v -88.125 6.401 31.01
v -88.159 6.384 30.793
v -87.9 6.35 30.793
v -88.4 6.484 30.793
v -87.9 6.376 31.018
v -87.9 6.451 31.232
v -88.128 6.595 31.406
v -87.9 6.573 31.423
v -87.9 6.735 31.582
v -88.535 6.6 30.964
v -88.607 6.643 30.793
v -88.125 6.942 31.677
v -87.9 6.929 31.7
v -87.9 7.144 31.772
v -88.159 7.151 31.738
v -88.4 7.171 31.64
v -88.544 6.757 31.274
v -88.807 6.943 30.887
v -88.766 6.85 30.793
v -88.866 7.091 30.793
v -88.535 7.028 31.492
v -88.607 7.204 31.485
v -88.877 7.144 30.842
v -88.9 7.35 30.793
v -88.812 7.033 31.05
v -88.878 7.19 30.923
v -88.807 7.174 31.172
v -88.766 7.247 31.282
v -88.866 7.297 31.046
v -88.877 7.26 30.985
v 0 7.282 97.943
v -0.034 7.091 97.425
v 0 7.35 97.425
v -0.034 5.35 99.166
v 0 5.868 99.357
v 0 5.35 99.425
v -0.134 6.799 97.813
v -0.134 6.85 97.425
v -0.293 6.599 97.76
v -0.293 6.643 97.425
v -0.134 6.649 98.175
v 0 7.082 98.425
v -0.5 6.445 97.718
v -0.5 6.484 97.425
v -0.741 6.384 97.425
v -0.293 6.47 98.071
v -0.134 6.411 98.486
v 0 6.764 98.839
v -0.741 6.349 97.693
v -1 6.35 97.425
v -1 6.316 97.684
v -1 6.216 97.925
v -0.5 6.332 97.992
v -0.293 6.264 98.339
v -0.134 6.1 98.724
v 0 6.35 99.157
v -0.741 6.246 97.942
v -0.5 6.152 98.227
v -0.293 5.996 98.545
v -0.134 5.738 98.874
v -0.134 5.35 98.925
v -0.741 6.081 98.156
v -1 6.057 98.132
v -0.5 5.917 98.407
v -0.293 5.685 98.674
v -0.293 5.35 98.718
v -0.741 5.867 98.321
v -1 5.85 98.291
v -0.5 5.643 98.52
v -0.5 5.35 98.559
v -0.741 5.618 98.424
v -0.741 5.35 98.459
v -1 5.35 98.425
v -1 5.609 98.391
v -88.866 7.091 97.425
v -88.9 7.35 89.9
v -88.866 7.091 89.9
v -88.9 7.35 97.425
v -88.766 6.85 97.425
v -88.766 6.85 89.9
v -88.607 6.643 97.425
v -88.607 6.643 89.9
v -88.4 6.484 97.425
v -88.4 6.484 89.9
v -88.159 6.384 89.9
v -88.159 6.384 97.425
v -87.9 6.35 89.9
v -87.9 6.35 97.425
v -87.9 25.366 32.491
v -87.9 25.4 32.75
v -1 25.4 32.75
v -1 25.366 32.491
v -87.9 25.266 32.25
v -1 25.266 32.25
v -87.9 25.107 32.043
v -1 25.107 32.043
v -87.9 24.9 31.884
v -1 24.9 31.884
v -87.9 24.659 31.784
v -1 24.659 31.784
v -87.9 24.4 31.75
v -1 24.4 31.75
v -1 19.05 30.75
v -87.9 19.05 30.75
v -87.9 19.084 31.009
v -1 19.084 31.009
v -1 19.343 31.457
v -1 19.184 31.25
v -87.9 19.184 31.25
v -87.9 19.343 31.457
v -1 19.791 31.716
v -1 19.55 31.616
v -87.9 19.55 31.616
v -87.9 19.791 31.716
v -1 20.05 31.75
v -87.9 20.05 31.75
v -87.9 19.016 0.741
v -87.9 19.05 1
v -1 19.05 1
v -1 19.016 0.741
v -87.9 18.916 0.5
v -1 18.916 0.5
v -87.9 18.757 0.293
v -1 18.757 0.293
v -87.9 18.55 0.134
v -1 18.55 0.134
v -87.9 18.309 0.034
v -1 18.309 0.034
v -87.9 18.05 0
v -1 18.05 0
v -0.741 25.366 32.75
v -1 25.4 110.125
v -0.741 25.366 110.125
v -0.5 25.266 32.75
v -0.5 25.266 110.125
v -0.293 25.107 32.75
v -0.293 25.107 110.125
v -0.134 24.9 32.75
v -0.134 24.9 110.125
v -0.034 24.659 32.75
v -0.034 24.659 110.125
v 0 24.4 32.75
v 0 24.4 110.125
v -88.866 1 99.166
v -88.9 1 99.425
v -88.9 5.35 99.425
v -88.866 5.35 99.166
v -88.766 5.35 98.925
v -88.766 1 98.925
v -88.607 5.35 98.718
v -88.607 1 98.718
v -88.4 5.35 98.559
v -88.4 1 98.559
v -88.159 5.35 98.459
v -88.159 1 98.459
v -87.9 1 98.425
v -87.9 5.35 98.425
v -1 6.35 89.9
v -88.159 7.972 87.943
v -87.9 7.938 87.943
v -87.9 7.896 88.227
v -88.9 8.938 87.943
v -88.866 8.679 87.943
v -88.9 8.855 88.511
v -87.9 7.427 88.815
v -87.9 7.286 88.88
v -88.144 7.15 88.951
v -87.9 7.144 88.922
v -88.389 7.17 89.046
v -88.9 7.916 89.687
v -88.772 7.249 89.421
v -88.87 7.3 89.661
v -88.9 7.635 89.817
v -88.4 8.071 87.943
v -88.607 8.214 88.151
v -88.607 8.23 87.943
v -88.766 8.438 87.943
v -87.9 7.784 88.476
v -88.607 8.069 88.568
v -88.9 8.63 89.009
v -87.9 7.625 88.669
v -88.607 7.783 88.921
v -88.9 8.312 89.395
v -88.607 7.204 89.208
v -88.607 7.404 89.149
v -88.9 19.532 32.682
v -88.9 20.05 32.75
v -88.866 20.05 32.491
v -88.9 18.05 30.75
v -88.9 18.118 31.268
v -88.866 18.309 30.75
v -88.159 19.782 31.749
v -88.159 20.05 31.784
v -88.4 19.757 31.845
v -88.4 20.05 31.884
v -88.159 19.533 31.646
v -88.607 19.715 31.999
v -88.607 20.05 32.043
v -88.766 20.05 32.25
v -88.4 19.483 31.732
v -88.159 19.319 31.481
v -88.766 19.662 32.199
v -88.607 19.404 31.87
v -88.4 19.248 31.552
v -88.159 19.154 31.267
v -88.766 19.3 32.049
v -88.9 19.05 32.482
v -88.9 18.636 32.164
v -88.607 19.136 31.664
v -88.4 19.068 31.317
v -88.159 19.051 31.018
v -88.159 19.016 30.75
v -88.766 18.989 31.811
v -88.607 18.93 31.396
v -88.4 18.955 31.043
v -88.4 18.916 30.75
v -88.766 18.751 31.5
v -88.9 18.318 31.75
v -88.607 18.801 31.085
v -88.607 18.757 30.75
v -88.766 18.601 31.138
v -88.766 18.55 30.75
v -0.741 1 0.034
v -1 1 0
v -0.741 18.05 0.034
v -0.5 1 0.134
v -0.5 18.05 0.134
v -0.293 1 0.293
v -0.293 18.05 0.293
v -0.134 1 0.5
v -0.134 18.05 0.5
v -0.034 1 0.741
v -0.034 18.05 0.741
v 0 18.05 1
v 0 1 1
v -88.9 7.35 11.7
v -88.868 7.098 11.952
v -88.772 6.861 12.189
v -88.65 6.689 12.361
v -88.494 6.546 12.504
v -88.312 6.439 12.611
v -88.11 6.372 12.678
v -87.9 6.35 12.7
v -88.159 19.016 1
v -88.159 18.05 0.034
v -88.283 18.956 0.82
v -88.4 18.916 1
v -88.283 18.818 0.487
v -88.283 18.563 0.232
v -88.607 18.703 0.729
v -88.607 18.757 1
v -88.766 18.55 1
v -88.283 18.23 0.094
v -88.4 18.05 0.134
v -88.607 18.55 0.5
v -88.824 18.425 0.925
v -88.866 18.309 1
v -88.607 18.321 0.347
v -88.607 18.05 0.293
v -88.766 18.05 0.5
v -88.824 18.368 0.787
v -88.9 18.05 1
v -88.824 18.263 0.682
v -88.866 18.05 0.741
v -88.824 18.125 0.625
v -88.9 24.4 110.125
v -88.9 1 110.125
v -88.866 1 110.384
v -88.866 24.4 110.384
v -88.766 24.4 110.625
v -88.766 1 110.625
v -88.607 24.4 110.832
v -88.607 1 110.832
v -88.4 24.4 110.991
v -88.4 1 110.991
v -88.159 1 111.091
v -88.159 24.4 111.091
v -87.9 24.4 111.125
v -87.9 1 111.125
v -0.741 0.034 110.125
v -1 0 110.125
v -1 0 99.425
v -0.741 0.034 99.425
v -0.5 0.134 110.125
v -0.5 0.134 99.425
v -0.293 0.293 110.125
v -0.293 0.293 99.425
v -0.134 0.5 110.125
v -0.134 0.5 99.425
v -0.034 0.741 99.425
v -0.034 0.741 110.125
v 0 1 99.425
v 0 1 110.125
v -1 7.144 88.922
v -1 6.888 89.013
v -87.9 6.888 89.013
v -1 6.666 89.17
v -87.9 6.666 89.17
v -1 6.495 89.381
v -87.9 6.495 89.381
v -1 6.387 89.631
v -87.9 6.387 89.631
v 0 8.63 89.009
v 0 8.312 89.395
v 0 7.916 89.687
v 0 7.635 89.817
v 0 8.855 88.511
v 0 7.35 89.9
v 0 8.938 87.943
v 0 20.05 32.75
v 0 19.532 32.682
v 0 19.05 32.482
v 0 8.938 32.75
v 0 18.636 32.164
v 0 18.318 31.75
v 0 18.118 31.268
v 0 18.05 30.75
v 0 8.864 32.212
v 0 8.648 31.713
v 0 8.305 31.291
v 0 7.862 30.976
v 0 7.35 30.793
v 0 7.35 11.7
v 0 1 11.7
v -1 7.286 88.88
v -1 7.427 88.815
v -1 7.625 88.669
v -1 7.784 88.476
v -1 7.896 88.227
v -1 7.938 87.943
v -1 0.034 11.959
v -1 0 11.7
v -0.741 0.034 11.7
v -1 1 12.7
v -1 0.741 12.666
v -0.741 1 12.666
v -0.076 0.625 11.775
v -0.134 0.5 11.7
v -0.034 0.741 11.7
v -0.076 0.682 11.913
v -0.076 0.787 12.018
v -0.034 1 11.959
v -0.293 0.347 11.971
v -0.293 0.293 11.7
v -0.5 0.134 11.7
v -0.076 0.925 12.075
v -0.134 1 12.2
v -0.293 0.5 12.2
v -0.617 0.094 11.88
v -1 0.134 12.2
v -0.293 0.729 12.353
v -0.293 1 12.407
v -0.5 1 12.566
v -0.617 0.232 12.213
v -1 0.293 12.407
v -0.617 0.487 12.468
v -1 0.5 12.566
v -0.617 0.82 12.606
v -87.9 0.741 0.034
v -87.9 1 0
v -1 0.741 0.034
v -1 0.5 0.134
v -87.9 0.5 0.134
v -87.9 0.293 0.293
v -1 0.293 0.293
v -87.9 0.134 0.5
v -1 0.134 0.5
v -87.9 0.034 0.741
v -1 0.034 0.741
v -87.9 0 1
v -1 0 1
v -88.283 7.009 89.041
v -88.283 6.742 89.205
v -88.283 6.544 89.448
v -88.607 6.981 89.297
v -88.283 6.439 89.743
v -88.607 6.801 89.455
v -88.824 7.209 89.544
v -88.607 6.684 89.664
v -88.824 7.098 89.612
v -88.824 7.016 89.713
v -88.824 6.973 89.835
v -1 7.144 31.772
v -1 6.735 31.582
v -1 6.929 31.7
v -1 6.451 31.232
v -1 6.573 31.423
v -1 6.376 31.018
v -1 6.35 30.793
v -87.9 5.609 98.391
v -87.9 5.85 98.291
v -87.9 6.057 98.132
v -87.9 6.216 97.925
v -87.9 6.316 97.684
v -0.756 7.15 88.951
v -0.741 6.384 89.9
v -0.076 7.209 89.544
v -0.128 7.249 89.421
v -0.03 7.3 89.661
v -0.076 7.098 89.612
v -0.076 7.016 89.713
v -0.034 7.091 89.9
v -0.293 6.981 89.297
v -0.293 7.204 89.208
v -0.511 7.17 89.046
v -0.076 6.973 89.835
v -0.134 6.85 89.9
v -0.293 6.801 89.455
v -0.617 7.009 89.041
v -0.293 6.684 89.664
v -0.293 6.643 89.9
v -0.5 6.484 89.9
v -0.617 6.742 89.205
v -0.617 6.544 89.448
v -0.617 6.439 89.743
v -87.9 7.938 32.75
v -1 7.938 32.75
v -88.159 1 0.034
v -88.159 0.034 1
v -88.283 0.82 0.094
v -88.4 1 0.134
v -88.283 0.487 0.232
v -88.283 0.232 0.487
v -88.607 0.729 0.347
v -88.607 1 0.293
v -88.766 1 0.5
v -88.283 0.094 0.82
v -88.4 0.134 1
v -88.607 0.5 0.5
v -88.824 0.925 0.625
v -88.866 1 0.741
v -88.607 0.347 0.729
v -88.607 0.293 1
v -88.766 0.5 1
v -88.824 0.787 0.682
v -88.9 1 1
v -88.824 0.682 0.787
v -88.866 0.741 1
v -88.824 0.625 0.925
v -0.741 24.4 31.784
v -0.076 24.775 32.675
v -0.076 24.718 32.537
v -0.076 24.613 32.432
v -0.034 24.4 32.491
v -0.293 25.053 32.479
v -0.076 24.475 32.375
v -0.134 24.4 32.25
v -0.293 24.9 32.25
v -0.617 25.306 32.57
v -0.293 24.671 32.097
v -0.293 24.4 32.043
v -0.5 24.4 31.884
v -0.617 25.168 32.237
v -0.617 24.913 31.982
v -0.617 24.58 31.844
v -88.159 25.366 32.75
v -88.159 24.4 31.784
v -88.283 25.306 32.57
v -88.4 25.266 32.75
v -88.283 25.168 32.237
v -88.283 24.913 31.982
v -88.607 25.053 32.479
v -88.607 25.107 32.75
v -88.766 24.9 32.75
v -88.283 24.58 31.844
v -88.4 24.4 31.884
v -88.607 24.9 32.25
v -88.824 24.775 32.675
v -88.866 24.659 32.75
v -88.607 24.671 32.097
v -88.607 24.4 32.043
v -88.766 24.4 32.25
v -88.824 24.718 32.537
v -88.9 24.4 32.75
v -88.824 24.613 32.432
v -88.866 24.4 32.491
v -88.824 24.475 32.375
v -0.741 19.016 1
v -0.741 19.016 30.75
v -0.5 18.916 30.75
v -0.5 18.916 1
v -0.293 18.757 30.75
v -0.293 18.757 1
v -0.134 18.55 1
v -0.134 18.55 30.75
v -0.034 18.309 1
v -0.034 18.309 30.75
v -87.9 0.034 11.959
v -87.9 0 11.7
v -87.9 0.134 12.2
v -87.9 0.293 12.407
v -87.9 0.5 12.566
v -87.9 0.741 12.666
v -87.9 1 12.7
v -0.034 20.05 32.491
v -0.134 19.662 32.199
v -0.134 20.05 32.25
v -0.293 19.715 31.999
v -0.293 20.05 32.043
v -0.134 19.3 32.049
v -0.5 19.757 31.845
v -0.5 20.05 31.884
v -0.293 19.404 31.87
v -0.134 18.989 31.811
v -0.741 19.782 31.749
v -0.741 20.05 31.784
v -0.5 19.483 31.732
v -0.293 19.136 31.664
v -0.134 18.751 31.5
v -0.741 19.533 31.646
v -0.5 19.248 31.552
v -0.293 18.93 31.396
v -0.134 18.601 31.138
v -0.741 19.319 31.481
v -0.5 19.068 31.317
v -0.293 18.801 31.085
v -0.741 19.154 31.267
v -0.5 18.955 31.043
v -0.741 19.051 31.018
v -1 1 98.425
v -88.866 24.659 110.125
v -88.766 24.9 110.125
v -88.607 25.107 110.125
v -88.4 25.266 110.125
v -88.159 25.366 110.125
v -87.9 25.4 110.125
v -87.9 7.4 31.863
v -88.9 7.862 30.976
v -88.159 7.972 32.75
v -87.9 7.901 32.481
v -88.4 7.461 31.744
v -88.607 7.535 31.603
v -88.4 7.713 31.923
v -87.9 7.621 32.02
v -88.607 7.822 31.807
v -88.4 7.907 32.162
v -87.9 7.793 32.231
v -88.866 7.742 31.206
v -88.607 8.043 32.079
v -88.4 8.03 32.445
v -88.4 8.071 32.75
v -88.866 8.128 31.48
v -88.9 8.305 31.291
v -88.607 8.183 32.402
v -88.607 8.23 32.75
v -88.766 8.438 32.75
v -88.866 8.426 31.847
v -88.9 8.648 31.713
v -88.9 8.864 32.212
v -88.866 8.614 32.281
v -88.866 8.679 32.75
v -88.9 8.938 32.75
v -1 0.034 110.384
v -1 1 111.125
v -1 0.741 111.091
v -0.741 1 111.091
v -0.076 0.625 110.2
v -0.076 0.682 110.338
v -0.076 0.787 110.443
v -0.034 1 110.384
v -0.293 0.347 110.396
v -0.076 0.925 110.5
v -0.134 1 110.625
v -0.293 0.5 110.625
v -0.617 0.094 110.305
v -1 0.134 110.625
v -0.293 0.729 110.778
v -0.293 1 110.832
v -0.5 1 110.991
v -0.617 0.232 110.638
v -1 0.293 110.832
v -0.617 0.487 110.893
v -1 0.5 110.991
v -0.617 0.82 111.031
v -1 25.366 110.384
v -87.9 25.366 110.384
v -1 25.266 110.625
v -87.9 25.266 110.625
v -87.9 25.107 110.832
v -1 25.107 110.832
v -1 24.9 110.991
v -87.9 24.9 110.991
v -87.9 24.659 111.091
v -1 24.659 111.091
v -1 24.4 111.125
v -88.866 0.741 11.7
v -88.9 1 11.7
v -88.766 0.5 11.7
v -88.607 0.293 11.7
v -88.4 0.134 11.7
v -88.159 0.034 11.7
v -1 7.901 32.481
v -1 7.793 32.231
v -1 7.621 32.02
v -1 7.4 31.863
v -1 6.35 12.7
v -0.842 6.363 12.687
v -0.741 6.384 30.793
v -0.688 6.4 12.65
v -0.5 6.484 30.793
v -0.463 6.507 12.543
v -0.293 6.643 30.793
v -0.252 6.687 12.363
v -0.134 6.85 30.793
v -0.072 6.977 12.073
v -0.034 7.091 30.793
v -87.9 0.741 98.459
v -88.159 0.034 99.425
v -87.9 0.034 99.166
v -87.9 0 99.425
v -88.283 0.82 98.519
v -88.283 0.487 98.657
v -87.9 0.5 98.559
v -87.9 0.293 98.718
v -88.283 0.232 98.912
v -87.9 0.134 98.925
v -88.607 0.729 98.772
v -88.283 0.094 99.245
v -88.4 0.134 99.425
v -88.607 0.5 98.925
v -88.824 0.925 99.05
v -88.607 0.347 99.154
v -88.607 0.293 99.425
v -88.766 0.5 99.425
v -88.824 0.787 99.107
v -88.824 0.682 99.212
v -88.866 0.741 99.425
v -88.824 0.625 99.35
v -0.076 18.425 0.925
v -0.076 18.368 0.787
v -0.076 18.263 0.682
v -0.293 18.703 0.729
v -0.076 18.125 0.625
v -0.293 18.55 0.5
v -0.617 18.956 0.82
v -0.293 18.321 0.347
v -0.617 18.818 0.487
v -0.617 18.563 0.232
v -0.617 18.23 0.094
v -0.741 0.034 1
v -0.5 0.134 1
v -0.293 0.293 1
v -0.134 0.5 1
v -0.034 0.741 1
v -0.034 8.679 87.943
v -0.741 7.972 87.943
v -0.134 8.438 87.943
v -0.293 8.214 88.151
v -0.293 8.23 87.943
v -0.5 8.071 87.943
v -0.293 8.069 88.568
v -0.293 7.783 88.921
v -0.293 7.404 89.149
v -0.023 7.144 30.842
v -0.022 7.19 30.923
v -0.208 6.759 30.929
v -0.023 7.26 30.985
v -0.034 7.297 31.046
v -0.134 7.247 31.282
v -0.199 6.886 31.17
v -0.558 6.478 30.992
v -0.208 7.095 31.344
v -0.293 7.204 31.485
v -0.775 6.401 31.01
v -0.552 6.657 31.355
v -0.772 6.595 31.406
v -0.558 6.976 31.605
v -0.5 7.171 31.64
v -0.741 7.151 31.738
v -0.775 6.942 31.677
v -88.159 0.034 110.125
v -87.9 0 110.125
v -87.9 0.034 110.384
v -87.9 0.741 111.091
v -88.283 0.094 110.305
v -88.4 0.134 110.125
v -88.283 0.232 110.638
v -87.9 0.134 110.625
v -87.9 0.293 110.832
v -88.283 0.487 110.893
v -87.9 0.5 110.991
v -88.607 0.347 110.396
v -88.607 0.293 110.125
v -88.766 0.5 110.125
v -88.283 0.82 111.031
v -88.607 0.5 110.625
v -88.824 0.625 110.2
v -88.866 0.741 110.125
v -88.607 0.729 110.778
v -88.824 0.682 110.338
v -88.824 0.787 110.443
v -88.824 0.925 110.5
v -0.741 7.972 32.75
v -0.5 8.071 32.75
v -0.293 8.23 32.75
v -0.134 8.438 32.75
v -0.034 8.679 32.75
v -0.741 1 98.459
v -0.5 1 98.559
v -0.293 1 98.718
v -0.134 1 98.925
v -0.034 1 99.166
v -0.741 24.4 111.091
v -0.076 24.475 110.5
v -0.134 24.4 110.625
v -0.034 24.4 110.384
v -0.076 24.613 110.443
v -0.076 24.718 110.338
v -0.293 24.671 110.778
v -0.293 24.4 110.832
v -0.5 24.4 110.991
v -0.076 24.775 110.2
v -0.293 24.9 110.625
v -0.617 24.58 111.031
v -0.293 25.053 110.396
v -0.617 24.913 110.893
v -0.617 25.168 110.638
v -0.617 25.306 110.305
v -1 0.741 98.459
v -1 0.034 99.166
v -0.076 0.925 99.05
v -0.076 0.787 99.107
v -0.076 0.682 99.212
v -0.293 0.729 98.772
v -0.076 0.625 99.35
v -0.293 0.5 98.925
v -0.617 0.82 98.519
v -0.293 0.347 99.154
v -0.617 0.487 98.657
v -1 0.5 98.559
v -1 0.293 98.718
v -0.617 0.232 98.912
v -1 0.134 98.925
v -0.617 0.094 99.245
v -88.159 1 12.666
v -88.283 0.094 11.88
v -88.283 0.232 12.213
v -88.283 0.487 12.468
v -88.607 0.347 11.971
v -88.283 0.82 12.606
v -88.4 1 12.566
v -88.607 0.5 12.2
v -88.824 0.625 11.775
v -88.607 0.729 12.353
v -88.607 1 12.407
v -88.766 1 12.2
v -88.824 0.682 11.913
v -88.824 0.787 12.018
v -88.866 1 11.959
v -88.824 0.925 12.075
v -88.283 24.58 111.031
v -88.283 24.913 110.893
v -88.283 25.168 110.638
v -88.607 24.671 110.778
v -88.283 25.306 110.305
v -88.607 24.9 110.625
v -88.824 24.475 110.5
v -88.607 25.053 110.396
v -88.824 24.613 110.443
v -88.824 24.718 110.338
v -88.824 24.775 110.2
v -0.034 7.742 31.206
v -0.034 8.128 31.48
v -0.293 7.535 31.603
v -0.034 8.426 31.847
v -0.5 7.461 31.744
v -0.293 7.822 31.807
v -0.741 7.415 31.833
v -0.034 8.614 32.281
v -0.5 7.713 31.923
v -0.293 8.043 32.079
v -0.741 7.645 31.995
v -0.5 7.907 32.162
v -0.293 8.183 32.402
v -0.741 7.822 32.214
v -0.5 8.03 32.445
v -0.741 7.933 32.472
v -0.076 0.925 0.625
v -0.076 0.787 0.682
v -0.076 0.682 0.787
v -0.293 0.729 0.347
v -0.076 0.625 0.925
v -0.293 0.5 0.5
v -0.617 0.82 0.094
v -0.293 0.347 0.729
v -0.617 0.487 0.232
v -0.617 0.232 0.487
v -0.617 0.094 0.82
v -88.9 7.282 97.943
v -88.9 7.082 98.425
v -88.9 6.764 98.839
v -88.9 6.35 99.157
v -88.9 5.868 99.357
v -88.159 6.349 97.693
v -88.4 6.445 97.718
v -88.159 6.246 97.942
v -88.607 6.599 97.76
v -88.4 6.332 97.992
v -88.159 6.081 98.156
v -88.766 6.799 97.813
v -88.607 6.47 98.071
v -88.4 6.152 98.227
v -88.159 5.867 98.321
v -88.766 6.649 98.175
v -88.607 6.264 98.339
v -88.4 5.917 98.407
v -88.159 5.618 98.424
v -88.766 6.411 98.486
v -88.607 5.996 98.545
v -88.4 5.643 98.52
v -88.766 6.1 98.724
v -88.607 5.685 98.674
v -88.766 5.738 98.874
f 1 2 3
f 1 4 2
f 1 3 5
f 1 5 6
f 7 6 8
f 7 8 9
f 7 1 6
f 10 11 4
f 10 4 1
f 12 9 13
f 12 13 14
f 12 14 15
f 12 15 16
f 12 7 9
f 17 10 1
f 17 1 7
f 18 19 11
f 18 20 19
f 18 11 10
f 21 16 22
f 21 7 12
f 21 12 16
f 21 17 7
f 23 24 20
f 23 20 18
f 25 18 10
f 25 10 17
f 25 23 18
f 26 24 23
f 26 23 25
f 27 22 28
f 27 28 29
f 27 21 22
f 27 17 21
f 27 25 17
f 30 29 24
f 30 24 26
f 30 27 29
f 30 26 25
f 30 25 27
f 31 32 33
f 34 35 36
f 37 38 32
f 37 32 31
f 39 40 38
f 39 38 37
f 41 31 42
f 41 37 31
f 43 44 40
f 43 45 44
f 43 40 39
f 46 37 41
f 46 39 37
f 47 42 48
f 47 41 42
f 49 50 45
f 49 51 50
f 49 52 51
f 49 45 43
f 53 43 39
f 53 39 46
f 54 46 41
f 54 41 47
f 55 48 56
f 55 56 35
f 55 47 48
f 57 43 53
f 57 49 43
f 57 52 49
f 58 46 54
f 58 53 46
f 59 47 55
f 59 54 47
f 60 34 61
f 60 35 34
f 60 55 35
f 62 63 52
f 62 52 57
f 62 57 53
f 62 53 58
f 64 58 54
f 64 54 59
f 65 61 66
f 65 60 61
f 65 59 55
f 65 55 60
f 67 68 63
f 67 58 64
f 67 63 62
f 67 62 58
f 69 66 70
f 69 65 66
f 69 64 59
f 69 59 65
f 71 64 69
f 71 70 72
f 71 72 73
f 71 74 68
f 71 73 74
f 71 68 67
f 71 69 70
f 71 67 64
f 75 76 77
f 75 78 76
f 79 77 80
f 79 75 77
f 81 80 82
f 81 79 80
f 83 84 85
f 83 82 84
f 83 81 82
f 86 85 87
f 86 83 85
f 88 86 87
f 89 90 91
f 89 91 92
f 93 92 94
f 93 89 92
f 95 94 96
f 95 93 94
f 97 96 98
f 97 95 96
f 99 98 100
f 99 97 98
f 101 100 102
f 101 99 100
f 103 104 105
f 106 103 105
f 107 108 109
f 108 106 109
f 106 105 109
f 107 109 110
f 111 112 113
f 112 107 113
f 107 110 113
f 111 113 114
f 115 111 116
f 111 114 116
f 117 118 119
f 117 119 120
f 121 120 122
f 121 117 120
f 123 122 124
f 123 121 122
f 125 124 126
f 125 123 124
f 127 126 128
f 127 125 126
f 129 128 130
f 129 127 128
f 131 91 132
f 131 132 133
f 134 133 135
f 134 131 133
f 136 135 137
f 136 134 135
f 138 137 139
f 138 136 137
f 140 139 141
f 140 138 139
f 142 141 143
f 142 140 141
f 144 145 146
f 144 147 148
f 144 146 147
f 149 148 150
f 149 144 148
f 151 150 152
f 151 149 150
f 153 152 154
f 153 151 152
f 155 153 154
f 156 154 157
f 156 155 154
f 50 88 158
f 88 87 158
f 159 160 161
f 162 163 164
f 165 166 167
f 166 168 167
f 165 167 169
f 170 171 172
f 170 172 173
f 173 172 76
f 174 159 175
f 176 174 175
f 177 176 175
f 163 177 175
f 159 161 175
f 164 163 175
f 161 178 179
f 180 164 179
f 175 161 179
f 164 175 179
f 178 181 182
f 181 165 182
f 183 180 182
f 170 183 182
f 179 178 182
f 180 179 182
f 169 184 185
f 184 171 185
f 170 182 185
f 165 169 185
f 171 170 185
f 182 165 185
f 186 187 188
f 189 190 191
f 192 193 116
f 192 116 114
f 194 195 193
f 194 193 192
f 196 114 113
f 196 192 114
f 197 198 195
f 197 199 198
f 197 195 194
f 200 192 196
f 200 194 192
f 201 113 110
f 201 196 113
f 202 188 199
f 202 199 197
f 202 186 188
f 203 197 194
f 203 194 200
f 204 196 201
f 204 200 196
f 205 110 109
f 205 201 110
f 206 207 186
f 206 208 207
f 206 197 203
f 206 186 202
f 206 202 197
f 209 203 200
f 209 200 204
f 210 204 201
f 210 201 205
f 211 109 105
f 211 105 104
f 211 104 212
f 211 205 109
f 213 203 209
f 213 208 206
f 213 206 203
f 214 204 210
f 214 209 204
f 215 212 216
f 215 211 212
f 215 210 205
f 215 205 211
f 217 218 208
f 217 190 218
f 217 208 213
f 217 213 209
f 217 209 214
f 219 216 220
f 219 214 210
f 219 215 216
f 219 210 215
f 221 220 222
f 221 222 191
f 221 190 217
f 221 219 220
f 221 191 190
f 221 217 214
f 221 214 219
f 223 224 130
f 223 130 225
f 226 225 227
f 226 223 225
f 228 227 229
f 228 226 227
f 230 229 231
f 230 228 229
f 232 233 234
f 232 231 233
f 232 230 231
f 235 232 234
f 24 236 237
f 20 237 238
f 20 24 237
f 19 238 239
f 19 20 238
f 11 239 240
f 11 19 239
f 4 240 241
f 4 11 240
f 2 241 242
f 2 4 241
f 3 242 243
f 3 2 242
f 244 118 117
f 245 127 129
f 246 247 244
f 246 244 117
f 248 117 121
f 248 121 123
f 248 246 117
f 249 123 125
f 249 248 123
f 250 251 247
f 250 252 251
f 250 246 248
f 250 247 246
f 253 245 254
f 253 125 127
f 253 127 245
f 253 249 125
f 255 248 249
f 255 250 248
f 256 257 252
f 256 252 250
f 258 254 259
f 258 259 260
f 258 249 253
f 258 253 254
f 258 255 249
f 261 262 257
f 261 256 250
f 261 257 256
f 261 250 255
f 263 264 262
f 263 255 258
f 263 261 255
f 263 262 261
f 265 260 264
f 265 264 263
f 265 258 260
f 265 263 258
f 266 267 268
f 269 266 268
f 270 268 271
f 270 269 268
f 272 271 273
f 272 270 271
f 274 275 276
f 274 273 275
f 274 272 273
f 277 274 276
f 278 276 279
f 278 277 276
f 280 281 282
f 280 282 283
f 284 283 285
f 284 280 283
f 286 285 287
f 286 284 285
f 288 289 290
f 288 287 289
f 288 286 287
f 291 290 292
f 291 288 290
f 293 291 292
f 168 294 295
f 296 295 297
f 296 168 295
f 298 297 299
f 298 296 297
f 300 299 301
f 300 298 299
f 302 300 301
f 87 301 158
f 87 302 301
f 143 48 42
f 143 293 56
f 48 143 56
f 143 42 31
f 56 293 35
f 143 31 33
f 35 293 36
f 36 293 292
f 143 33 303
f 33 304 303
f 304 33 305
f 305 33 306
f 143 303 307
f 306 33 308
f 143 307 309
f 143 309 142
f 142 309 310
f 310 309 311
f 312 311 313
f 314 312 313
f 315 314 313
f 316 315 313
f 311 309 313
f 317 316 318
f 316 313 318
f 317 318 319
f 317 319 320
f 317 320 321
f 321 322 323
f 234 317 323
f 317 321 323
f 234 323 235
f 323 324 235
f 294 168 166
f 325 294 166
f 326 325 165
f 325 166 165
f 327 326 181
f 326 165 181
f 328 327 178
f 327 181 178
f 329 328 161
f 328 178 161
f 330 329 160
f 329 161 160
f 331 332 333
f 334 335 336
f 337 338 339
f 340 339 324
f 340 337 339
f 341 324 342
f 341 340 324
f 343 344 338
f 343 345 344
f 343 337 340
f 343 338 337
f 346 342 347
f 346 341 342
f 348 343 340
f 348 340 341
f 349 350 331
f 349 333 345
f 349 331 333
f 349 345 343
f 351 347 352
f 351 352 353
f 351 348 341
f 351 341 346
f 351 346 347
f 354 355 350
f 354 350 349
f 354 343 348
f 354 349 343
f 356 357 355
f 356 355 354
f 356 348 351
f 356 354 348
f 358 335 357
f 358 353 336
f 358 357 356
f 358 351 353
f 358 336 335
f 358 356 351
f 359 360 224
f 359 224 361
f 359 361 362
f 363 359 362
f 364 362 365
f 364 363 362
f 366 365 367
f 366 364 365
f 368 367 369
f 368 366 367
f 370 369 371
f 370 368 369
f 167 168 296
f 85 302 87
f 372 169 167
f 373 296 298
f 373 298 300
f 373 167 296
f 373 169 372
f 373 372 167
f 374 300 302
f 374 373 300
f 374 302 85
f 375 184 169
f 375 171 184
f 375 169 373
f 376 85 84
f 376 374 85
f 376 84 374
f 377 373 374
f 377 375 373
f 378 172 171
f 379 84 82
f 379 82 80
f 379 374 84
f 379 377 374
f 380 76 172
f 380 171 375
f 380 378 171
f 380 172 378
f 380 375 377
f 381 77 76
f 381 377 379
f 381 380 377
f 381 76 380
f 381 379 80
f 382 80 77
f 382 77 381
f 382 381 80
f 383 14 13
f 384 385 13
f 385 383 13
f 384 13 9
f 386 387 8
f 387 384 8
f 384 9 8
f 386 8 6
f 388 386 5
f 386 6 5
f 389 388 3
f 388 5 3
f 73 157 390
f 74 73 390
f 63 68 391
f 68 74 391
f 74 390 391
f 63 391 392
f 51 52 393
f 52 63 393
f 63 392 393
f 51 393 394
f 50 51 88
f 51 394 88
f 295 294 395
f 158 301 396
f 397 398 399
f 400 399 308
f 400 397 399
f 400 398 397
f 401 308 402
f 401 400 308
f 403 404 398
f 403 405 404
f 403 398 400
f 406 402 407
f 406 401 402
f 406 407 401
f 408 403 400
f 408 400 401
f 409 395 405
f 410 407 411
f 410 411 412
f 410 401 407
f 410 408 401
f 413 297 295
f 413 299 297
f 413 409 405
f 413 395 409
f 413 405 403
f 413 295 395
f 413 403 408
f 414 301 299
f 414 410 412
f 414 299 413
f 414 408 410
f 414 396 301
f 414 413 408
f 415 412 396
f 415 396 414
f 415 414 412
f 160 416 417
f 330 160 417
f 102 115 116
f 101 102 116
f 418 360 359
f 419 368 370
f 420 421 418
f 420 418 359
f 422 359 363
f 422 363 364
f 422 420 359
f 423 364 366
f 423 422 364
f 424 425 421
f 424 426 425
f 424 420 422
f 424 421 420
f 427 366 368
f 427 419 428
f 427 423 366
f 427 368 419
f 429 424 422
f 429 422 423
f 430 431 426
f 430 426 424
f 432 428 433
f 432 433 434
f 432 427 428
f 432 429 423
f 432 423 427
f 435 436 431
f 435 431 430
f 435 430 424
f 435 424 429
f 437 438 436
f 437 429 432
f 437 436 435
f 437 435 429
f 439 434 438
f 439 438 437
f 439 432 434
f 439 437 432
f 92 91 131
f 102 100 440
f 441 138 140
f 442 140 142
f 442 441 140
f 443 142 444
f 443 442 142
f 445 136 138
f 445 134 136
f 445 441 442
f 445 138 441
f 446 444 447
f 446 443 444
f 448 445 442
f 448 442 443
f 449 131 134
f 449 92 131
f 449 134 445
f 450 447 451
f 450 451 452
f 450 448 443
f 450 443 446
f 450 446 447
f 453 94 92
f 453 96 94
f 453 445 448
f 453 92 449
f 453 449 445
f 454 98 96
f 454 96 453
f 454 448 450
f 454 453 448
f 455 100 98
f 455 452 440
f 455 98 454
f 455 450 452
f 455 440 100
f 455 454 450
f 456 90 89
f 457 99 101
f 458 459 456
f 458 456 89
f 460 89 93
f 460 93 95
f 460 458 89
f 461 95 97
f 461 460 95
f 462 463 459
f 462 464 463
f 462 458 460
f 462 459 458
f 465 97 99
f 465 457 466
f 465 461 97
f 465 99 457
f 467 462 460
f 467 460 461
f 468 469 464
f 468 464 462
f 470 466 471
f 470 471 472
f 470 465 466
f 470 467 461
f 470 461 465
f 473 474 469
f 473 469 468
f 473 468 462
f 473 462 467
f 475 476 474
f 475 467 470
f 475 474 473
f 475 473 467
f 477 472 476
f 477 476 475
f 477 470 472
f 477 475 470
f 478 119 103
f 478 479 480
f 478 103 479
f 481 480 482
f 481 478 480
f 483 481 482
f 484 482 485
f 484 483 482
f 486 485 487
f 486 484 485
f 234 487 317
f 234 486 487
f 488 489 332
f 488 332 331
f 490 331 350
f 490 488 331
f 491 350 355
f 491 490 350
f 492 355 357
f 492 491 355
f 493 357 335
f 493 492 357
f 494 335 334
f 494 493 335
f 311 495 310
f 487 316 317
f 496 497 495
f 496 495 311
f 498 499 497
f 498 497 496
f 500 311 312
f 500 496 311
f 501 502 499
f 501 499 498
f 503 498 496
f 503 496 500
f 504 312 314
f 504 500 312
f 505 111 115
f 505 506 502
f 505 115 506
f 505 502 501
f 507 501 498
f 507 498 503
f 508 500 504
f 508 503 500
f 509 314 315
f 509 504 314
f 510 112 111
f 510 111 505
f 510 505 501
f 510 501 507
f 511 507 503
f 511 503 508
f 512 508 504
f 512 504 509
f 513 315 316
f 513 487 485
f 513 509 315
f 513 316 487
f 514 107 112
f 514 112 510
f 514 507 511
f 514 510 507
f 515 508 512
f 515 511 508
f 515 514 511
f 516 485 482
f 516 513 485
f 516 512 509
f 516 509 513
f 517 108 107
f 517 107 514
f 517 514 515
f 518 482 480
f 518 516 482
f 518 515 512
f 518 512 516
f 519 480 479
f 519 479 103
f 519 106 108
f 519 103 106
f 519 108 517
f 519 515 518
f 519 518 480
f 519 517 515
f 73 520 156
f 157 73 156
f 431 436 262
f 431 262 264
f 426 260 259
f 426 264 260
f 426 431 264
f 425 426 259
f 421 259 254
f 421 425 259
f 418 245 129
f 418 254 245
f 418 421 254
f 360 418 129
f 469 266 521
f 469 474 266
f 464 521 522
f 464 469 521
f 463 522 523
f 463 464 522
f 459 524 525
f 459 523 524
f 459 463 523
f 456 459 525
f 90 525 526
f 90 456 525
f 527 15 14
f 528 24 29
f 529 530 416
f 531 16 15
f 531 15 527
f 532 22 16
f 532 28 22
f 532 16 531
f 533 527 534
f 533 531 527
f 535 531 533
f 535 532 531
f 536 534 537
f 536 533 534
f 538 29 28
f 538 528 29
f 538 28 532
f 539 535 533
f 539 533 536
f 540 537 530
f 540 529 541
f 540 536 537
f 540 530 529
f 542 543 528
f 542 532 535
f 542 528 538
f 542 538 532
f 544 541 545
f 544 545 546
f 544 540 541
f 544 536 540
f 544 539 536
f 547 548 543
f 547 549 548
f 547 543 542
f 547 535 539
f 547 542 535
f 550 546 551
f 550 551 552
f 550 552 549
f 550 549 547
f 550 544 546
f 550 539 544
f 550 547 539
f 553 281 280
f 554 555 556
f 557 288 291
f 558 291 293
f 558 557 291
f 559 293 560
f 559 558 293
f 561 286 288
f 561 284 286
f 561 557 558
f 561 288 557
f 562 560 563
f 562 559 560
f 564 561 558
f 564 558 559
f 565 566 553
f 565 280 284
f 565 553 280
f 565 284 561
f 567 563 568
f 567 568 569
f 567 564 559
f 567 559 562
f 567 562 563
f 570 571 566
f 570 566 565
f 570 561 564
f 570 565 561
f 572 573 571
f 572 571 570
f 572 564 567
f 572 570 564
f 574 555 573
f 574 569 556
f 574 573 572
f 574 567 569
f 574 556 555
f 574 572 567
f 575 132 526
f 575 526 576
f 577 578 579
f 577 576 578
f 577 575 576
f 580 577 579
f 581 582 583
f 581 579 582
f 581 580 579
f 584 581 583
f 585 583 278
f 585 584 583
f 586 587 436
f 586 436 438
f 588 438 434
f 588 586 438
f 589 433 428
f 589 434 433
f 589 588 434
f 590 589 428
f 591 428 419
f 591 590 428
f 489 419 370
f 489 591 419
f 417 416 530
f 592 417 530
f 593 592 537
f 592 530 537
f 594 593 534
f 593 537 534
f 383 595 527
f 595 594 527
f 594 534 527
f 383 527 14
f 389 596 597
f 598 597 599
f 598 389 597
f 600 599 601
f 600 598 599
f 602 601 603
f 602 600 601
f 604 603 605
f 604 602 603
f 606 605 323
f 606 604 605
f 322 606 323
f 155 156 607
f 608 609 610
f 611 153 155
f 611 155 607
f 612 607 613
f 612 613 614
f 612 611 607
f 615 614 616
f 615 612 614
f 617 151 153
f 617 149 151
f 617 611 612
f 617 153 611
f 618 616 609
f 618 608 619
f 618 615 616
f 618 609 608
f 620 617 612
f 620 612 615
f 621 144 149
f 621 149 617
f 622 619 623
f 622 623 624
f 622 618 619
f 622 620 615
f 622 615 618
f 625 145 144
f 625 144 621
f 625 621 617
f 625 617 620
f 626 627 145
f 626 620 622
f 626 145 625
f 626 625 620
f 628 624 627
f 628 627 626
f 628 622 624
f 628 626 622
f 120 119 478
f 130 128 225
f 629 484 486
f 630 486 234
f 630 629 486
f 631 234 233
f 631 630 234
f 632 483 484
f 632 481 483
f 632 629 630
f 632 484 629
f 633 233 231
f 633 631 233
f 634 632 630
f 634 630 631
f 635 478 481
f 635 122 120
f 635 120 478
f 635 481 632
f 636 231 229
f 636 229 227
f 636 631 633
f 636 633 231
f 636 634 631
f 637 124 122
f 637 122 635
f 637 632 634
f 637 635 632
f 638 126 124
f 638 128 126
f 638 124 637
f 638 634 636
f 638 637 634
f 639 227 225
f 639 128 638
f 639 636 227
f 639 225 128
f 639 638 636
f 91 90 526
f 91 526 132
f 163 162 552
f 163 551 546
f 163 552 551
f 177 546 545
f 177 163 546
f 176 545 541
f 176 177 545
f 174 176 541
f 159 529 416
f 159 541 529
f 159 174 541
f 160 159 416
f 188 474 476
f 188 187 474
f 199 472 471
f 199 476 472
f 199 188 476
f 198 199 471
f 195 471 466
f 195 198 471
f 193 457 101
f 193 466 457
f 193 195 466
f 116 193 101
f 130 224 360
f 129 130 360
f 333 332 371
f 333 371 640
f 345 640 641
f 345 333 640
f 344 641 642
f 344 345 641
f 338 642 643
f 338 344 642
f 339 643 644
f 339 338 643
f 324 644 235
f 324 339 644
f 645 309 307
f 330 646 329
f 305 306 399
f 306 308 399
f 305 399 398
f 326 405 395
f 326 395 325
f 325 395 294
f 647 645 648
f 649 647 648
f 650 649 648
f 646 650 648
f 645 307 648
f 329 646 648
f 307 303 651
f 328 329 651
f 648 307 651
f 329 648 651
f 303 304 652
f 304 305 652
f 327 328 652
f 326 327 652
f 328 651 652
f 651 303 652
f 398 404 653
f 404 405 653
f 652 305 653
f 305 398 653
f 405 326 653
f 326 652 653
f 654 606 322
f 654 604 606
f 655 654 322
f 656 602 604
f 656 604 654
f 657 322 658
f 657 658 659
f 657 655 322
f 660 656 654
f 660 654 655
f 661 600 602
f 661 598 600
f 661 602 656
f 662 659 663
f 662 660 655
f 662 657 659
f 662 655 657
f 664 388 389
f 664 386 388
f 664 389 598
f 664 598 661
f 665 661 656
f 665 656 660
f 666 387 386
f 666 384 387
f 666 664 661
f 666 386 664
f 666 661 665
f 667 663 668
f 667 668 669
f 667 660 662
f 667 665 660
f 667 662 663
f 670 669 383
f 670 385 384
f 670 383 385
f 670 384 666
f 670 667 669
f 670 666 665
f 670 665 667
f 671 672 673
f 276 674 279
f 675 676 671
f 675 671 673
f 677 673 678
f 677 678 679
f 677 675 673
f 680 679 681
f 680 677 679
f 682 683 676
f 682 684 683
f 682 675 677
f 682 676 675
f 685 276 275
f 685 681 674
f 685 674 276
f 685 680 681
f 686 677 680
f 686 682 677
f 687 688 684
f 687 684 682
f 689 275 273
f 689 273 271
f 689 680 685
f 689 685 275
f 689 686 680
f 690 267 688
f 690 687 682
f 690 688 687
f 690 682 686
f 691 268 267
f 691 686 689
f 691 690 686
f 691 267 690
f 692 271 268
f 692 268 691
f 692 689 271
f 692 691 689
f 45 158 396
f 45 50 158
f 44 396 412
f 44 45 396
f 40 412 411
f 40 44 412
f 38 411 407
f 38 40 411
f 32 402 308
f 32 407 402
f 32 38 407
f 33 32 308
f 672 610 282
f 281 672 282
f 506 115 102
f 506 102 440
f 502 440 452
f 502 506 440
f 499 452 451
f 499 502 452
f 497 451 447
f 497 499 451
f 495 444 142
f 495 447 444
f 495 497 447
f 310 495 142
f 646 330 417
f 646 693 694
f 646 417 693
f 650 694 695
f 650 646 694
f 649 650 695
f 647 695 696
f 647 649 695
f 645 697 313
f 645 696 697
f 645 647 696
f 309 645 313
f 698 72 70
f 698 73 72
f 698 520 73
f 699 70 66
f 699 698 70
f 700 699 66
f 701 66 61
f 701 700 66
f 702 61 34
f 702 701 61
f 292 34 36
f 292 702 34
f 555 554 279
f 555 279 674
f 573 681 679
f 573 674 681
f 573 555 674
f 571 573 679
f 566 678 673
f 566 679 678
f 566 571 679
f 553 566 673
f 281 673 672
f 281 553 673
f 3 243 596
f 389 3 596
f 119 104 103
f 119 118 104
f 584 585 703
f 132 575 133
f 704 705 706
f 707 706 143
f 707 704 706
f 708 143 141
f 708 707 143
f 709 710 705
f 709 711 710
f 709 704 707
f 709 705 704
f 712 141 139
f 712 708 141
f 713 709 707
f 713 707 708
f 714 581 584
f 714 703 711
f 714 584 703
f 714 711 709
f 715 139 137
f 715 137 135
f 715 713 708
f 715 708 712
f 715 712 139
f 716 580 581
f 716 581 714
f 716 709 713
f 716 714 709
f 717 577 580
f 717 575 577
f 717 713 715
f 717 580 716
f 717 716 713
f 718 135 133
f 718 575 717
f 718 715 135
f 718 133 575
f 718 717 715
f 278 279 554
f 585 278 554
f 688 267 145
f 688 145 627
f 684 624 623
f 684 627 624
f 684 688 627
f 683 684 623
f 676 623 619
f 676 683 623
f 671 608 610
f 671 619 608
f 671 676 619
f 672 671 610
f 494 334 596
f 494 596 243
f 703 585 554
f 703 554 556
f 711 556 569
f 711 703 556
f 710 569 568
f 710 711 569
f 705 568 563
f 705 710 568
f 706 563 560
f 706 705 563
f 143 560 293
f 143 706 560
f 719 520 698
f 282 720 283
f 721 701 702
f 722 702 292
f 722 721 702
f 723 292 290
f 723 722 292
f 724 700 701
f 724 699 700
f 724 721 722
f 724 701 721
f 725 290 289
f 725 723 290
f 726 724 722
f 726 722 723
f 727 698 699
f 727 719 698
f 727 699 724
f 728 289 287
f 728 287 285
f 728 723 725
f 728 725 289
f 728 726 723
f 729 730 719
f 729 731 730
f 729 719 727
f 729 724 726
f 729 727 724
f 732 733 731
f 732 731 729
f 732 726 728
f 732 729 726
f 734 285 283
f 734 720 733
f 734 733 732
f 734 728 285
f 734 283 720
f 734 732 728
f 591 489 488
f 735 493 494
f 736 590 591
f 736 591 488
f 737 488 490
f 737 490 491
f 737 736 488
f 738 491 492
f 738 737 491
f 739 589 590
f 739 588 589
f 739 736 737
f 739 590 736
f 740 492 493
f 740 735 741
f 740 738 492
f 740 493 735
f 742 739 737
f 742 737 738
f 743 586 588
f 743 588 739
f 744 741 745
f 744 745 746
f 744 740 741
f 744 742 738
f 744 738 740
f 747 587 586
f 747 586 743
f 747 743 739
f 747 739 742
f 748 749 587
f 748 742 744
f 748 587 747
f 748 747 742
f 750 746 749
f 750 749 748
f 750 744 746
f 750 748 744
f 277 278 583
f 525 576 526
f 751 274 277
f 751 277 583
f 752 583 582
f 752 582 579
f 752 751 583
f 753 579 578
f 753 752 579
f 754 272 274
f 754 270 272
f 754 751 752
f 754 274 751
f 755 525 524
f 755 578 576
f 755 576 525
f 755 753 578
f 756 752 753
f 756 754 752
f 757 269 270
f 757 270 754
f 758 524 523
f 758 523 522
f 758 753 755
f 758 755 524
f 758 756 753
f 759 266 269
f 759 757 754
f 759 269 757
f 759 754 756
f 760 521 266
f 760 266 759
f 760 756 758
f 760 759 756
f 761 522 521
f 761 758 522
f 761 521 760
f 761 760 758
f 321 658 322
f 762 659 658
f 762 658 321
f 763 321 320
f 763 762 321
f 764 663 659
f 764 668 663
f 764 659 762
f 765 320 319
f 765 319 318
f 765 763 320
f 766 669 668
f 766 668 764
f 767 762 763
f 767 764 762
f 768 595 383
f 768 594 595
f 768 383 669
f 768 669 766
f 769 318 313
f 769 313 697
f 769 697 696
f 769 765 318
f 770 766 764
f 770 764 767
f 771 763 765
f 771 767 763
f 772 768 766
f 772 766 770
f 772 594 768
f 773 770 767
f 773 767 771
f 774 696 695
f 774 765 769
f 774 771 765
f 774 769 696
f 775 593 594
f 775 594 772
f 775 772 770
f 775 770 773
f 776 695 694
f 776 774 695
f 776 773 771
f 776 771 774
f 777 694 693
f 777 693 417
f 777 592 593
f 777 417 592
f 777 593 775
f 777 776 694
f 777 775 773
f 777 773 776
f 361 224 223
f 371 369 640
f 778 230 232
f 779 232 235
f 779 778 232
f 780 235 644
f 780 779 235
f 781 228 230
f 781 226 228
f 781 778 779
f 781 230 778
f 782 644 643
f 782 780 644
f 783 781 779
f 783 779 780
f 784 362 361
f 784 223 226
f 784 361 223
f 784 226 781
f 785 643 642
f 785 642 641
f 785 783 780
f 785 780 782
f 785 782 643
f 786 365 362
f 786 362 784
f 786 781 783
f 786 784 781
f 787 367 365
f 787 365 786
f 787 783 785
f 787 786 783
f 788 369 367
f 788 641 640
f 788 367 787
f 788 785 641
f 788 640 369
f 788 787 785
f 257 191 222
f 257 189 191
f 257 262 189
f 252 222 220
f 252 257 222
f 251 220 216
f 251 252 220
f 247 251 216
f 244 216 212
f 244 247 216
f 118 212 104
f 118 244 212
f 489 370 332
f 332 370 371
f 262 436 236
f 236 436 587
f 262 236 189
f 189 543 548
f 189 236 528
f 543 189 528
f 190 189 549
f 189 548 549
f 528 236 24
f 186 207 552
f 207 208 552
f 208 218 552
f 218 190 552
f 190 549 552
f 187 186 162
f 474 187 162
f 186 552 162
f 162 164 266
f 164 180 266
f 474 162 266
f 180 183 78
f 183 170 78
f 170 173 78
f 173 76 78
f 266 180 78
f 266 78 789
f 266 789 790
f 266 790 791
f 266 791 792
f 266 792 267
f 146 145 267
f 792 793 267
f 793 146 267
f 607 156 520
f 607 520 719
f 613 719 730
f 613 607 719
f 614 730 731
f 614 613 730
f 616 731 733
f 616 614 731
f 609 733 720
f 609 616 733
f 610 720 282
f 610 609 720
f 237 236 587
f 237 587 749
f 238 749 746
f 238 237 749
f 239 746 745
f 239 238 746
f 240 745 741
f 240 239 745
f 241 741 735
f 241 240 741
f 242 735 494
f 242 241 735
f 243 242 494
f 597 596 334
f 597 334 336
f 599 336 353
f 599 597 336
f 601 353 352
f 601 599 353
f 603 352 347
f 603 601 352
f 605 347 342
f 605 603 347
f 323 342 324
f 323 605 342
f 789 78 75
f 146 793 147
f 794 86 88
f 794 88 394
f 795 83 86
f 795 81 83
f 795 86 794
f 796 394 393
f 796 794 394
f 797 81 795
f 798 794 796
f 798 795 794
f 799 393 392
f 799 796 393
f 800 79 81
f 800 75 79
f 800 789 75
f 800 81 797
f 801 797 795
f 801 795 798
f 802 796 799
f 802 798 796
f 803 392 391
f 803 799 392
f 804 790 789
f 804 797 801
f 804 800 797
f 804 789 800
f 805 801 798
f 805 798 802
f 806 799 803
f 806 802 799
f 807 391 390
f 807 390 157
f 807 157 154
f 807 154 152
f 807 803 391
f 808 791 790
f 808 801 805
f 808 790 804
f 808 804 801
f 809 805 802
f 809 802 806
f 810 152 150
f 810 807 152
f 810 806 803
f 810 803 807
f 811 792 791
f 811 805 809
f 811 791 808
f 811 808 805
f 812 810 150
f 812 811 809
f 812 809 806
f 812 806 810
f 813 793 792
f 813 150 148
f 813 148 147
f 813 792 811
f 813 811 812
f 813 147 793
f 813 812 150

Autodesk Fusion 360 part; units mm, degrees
sketch "Sketch1" plane through (0, 0, 0) normal (0, 1, 0) x (1, 0, 0)
  line L0 (0, 0) -> (-88.9, 0)
  line L1 (-88.9, 0) -> (-88.9, -111.125)
  line L2 (-88.9, -111.125) -> (0, -111.125)
  line L3 (0, -111.125) -> (0, 0)
  line L4 (0, -12.7) -> (-88.9, -12.7)
  line L5 (0, -31.75) -> (-88.9, -31.75)
  line L6 (0, -88.9) -> (-88.9, -88.9)
  line L7 (0, -98.425) -> (-88.9, -98.425)
  dimension "d1" = 88.9
  dimension "d2" = 111.125
  dimension "d3" = 12.7
  dimension "d5" = 19.05
  dimension "d6" = 12.7
  dimension "d7" = 9.525
extrude "Extrude1" add sketch "Sketch1" along normal blind 25.4 contours L1 L3 L5 L6 | L1 L3 L6 L7 | L1 L2 L3 L7
extrude "Extrude2" add sketch "Sketch1" along normal blind 19.05 contours L0 L1 L3 L4 | L1 L3 L4 L5
extrude "Extrude3" cut sketch "Sketch1" along normal blind 6.35 contours L1 L3 L4 L5 | L1 L3 L6 L7
extrude "Extrude4" cut sketch "Sketch1" along normal blind 7.9375 contours L1 L3 L5 L6
fillet "Fillet1" radius 1 13 edges at (-44.45, 6.35, 98.425) (-44.45, 6.35, 88.9) (-44.45, 7.9375, 88.9) (-44.45, 7.9375, 31.75) (-44.45, 6.35, 31.75) (-44.45, 0, 12.7) (-44.45, 0, 98.425) (-44.45, 0, 0) (-44.45, 19.05, 0) (-44.45, 19.05, 31.75) (-44.45, 25.4, 31.75) (-44.45, 25.4, 111.125) (-44.45, 0, 111.125)
fillet "Fillet2" radius 1 2 faces at (0, 19.5792, 76.9393) (-88.9, 19.5792, 76.9393)
equation "d2 = 4 3/8\""
equation "d7 = 3 in / 8"
equation "d14 = 0.25 in + 1\" / 16"
